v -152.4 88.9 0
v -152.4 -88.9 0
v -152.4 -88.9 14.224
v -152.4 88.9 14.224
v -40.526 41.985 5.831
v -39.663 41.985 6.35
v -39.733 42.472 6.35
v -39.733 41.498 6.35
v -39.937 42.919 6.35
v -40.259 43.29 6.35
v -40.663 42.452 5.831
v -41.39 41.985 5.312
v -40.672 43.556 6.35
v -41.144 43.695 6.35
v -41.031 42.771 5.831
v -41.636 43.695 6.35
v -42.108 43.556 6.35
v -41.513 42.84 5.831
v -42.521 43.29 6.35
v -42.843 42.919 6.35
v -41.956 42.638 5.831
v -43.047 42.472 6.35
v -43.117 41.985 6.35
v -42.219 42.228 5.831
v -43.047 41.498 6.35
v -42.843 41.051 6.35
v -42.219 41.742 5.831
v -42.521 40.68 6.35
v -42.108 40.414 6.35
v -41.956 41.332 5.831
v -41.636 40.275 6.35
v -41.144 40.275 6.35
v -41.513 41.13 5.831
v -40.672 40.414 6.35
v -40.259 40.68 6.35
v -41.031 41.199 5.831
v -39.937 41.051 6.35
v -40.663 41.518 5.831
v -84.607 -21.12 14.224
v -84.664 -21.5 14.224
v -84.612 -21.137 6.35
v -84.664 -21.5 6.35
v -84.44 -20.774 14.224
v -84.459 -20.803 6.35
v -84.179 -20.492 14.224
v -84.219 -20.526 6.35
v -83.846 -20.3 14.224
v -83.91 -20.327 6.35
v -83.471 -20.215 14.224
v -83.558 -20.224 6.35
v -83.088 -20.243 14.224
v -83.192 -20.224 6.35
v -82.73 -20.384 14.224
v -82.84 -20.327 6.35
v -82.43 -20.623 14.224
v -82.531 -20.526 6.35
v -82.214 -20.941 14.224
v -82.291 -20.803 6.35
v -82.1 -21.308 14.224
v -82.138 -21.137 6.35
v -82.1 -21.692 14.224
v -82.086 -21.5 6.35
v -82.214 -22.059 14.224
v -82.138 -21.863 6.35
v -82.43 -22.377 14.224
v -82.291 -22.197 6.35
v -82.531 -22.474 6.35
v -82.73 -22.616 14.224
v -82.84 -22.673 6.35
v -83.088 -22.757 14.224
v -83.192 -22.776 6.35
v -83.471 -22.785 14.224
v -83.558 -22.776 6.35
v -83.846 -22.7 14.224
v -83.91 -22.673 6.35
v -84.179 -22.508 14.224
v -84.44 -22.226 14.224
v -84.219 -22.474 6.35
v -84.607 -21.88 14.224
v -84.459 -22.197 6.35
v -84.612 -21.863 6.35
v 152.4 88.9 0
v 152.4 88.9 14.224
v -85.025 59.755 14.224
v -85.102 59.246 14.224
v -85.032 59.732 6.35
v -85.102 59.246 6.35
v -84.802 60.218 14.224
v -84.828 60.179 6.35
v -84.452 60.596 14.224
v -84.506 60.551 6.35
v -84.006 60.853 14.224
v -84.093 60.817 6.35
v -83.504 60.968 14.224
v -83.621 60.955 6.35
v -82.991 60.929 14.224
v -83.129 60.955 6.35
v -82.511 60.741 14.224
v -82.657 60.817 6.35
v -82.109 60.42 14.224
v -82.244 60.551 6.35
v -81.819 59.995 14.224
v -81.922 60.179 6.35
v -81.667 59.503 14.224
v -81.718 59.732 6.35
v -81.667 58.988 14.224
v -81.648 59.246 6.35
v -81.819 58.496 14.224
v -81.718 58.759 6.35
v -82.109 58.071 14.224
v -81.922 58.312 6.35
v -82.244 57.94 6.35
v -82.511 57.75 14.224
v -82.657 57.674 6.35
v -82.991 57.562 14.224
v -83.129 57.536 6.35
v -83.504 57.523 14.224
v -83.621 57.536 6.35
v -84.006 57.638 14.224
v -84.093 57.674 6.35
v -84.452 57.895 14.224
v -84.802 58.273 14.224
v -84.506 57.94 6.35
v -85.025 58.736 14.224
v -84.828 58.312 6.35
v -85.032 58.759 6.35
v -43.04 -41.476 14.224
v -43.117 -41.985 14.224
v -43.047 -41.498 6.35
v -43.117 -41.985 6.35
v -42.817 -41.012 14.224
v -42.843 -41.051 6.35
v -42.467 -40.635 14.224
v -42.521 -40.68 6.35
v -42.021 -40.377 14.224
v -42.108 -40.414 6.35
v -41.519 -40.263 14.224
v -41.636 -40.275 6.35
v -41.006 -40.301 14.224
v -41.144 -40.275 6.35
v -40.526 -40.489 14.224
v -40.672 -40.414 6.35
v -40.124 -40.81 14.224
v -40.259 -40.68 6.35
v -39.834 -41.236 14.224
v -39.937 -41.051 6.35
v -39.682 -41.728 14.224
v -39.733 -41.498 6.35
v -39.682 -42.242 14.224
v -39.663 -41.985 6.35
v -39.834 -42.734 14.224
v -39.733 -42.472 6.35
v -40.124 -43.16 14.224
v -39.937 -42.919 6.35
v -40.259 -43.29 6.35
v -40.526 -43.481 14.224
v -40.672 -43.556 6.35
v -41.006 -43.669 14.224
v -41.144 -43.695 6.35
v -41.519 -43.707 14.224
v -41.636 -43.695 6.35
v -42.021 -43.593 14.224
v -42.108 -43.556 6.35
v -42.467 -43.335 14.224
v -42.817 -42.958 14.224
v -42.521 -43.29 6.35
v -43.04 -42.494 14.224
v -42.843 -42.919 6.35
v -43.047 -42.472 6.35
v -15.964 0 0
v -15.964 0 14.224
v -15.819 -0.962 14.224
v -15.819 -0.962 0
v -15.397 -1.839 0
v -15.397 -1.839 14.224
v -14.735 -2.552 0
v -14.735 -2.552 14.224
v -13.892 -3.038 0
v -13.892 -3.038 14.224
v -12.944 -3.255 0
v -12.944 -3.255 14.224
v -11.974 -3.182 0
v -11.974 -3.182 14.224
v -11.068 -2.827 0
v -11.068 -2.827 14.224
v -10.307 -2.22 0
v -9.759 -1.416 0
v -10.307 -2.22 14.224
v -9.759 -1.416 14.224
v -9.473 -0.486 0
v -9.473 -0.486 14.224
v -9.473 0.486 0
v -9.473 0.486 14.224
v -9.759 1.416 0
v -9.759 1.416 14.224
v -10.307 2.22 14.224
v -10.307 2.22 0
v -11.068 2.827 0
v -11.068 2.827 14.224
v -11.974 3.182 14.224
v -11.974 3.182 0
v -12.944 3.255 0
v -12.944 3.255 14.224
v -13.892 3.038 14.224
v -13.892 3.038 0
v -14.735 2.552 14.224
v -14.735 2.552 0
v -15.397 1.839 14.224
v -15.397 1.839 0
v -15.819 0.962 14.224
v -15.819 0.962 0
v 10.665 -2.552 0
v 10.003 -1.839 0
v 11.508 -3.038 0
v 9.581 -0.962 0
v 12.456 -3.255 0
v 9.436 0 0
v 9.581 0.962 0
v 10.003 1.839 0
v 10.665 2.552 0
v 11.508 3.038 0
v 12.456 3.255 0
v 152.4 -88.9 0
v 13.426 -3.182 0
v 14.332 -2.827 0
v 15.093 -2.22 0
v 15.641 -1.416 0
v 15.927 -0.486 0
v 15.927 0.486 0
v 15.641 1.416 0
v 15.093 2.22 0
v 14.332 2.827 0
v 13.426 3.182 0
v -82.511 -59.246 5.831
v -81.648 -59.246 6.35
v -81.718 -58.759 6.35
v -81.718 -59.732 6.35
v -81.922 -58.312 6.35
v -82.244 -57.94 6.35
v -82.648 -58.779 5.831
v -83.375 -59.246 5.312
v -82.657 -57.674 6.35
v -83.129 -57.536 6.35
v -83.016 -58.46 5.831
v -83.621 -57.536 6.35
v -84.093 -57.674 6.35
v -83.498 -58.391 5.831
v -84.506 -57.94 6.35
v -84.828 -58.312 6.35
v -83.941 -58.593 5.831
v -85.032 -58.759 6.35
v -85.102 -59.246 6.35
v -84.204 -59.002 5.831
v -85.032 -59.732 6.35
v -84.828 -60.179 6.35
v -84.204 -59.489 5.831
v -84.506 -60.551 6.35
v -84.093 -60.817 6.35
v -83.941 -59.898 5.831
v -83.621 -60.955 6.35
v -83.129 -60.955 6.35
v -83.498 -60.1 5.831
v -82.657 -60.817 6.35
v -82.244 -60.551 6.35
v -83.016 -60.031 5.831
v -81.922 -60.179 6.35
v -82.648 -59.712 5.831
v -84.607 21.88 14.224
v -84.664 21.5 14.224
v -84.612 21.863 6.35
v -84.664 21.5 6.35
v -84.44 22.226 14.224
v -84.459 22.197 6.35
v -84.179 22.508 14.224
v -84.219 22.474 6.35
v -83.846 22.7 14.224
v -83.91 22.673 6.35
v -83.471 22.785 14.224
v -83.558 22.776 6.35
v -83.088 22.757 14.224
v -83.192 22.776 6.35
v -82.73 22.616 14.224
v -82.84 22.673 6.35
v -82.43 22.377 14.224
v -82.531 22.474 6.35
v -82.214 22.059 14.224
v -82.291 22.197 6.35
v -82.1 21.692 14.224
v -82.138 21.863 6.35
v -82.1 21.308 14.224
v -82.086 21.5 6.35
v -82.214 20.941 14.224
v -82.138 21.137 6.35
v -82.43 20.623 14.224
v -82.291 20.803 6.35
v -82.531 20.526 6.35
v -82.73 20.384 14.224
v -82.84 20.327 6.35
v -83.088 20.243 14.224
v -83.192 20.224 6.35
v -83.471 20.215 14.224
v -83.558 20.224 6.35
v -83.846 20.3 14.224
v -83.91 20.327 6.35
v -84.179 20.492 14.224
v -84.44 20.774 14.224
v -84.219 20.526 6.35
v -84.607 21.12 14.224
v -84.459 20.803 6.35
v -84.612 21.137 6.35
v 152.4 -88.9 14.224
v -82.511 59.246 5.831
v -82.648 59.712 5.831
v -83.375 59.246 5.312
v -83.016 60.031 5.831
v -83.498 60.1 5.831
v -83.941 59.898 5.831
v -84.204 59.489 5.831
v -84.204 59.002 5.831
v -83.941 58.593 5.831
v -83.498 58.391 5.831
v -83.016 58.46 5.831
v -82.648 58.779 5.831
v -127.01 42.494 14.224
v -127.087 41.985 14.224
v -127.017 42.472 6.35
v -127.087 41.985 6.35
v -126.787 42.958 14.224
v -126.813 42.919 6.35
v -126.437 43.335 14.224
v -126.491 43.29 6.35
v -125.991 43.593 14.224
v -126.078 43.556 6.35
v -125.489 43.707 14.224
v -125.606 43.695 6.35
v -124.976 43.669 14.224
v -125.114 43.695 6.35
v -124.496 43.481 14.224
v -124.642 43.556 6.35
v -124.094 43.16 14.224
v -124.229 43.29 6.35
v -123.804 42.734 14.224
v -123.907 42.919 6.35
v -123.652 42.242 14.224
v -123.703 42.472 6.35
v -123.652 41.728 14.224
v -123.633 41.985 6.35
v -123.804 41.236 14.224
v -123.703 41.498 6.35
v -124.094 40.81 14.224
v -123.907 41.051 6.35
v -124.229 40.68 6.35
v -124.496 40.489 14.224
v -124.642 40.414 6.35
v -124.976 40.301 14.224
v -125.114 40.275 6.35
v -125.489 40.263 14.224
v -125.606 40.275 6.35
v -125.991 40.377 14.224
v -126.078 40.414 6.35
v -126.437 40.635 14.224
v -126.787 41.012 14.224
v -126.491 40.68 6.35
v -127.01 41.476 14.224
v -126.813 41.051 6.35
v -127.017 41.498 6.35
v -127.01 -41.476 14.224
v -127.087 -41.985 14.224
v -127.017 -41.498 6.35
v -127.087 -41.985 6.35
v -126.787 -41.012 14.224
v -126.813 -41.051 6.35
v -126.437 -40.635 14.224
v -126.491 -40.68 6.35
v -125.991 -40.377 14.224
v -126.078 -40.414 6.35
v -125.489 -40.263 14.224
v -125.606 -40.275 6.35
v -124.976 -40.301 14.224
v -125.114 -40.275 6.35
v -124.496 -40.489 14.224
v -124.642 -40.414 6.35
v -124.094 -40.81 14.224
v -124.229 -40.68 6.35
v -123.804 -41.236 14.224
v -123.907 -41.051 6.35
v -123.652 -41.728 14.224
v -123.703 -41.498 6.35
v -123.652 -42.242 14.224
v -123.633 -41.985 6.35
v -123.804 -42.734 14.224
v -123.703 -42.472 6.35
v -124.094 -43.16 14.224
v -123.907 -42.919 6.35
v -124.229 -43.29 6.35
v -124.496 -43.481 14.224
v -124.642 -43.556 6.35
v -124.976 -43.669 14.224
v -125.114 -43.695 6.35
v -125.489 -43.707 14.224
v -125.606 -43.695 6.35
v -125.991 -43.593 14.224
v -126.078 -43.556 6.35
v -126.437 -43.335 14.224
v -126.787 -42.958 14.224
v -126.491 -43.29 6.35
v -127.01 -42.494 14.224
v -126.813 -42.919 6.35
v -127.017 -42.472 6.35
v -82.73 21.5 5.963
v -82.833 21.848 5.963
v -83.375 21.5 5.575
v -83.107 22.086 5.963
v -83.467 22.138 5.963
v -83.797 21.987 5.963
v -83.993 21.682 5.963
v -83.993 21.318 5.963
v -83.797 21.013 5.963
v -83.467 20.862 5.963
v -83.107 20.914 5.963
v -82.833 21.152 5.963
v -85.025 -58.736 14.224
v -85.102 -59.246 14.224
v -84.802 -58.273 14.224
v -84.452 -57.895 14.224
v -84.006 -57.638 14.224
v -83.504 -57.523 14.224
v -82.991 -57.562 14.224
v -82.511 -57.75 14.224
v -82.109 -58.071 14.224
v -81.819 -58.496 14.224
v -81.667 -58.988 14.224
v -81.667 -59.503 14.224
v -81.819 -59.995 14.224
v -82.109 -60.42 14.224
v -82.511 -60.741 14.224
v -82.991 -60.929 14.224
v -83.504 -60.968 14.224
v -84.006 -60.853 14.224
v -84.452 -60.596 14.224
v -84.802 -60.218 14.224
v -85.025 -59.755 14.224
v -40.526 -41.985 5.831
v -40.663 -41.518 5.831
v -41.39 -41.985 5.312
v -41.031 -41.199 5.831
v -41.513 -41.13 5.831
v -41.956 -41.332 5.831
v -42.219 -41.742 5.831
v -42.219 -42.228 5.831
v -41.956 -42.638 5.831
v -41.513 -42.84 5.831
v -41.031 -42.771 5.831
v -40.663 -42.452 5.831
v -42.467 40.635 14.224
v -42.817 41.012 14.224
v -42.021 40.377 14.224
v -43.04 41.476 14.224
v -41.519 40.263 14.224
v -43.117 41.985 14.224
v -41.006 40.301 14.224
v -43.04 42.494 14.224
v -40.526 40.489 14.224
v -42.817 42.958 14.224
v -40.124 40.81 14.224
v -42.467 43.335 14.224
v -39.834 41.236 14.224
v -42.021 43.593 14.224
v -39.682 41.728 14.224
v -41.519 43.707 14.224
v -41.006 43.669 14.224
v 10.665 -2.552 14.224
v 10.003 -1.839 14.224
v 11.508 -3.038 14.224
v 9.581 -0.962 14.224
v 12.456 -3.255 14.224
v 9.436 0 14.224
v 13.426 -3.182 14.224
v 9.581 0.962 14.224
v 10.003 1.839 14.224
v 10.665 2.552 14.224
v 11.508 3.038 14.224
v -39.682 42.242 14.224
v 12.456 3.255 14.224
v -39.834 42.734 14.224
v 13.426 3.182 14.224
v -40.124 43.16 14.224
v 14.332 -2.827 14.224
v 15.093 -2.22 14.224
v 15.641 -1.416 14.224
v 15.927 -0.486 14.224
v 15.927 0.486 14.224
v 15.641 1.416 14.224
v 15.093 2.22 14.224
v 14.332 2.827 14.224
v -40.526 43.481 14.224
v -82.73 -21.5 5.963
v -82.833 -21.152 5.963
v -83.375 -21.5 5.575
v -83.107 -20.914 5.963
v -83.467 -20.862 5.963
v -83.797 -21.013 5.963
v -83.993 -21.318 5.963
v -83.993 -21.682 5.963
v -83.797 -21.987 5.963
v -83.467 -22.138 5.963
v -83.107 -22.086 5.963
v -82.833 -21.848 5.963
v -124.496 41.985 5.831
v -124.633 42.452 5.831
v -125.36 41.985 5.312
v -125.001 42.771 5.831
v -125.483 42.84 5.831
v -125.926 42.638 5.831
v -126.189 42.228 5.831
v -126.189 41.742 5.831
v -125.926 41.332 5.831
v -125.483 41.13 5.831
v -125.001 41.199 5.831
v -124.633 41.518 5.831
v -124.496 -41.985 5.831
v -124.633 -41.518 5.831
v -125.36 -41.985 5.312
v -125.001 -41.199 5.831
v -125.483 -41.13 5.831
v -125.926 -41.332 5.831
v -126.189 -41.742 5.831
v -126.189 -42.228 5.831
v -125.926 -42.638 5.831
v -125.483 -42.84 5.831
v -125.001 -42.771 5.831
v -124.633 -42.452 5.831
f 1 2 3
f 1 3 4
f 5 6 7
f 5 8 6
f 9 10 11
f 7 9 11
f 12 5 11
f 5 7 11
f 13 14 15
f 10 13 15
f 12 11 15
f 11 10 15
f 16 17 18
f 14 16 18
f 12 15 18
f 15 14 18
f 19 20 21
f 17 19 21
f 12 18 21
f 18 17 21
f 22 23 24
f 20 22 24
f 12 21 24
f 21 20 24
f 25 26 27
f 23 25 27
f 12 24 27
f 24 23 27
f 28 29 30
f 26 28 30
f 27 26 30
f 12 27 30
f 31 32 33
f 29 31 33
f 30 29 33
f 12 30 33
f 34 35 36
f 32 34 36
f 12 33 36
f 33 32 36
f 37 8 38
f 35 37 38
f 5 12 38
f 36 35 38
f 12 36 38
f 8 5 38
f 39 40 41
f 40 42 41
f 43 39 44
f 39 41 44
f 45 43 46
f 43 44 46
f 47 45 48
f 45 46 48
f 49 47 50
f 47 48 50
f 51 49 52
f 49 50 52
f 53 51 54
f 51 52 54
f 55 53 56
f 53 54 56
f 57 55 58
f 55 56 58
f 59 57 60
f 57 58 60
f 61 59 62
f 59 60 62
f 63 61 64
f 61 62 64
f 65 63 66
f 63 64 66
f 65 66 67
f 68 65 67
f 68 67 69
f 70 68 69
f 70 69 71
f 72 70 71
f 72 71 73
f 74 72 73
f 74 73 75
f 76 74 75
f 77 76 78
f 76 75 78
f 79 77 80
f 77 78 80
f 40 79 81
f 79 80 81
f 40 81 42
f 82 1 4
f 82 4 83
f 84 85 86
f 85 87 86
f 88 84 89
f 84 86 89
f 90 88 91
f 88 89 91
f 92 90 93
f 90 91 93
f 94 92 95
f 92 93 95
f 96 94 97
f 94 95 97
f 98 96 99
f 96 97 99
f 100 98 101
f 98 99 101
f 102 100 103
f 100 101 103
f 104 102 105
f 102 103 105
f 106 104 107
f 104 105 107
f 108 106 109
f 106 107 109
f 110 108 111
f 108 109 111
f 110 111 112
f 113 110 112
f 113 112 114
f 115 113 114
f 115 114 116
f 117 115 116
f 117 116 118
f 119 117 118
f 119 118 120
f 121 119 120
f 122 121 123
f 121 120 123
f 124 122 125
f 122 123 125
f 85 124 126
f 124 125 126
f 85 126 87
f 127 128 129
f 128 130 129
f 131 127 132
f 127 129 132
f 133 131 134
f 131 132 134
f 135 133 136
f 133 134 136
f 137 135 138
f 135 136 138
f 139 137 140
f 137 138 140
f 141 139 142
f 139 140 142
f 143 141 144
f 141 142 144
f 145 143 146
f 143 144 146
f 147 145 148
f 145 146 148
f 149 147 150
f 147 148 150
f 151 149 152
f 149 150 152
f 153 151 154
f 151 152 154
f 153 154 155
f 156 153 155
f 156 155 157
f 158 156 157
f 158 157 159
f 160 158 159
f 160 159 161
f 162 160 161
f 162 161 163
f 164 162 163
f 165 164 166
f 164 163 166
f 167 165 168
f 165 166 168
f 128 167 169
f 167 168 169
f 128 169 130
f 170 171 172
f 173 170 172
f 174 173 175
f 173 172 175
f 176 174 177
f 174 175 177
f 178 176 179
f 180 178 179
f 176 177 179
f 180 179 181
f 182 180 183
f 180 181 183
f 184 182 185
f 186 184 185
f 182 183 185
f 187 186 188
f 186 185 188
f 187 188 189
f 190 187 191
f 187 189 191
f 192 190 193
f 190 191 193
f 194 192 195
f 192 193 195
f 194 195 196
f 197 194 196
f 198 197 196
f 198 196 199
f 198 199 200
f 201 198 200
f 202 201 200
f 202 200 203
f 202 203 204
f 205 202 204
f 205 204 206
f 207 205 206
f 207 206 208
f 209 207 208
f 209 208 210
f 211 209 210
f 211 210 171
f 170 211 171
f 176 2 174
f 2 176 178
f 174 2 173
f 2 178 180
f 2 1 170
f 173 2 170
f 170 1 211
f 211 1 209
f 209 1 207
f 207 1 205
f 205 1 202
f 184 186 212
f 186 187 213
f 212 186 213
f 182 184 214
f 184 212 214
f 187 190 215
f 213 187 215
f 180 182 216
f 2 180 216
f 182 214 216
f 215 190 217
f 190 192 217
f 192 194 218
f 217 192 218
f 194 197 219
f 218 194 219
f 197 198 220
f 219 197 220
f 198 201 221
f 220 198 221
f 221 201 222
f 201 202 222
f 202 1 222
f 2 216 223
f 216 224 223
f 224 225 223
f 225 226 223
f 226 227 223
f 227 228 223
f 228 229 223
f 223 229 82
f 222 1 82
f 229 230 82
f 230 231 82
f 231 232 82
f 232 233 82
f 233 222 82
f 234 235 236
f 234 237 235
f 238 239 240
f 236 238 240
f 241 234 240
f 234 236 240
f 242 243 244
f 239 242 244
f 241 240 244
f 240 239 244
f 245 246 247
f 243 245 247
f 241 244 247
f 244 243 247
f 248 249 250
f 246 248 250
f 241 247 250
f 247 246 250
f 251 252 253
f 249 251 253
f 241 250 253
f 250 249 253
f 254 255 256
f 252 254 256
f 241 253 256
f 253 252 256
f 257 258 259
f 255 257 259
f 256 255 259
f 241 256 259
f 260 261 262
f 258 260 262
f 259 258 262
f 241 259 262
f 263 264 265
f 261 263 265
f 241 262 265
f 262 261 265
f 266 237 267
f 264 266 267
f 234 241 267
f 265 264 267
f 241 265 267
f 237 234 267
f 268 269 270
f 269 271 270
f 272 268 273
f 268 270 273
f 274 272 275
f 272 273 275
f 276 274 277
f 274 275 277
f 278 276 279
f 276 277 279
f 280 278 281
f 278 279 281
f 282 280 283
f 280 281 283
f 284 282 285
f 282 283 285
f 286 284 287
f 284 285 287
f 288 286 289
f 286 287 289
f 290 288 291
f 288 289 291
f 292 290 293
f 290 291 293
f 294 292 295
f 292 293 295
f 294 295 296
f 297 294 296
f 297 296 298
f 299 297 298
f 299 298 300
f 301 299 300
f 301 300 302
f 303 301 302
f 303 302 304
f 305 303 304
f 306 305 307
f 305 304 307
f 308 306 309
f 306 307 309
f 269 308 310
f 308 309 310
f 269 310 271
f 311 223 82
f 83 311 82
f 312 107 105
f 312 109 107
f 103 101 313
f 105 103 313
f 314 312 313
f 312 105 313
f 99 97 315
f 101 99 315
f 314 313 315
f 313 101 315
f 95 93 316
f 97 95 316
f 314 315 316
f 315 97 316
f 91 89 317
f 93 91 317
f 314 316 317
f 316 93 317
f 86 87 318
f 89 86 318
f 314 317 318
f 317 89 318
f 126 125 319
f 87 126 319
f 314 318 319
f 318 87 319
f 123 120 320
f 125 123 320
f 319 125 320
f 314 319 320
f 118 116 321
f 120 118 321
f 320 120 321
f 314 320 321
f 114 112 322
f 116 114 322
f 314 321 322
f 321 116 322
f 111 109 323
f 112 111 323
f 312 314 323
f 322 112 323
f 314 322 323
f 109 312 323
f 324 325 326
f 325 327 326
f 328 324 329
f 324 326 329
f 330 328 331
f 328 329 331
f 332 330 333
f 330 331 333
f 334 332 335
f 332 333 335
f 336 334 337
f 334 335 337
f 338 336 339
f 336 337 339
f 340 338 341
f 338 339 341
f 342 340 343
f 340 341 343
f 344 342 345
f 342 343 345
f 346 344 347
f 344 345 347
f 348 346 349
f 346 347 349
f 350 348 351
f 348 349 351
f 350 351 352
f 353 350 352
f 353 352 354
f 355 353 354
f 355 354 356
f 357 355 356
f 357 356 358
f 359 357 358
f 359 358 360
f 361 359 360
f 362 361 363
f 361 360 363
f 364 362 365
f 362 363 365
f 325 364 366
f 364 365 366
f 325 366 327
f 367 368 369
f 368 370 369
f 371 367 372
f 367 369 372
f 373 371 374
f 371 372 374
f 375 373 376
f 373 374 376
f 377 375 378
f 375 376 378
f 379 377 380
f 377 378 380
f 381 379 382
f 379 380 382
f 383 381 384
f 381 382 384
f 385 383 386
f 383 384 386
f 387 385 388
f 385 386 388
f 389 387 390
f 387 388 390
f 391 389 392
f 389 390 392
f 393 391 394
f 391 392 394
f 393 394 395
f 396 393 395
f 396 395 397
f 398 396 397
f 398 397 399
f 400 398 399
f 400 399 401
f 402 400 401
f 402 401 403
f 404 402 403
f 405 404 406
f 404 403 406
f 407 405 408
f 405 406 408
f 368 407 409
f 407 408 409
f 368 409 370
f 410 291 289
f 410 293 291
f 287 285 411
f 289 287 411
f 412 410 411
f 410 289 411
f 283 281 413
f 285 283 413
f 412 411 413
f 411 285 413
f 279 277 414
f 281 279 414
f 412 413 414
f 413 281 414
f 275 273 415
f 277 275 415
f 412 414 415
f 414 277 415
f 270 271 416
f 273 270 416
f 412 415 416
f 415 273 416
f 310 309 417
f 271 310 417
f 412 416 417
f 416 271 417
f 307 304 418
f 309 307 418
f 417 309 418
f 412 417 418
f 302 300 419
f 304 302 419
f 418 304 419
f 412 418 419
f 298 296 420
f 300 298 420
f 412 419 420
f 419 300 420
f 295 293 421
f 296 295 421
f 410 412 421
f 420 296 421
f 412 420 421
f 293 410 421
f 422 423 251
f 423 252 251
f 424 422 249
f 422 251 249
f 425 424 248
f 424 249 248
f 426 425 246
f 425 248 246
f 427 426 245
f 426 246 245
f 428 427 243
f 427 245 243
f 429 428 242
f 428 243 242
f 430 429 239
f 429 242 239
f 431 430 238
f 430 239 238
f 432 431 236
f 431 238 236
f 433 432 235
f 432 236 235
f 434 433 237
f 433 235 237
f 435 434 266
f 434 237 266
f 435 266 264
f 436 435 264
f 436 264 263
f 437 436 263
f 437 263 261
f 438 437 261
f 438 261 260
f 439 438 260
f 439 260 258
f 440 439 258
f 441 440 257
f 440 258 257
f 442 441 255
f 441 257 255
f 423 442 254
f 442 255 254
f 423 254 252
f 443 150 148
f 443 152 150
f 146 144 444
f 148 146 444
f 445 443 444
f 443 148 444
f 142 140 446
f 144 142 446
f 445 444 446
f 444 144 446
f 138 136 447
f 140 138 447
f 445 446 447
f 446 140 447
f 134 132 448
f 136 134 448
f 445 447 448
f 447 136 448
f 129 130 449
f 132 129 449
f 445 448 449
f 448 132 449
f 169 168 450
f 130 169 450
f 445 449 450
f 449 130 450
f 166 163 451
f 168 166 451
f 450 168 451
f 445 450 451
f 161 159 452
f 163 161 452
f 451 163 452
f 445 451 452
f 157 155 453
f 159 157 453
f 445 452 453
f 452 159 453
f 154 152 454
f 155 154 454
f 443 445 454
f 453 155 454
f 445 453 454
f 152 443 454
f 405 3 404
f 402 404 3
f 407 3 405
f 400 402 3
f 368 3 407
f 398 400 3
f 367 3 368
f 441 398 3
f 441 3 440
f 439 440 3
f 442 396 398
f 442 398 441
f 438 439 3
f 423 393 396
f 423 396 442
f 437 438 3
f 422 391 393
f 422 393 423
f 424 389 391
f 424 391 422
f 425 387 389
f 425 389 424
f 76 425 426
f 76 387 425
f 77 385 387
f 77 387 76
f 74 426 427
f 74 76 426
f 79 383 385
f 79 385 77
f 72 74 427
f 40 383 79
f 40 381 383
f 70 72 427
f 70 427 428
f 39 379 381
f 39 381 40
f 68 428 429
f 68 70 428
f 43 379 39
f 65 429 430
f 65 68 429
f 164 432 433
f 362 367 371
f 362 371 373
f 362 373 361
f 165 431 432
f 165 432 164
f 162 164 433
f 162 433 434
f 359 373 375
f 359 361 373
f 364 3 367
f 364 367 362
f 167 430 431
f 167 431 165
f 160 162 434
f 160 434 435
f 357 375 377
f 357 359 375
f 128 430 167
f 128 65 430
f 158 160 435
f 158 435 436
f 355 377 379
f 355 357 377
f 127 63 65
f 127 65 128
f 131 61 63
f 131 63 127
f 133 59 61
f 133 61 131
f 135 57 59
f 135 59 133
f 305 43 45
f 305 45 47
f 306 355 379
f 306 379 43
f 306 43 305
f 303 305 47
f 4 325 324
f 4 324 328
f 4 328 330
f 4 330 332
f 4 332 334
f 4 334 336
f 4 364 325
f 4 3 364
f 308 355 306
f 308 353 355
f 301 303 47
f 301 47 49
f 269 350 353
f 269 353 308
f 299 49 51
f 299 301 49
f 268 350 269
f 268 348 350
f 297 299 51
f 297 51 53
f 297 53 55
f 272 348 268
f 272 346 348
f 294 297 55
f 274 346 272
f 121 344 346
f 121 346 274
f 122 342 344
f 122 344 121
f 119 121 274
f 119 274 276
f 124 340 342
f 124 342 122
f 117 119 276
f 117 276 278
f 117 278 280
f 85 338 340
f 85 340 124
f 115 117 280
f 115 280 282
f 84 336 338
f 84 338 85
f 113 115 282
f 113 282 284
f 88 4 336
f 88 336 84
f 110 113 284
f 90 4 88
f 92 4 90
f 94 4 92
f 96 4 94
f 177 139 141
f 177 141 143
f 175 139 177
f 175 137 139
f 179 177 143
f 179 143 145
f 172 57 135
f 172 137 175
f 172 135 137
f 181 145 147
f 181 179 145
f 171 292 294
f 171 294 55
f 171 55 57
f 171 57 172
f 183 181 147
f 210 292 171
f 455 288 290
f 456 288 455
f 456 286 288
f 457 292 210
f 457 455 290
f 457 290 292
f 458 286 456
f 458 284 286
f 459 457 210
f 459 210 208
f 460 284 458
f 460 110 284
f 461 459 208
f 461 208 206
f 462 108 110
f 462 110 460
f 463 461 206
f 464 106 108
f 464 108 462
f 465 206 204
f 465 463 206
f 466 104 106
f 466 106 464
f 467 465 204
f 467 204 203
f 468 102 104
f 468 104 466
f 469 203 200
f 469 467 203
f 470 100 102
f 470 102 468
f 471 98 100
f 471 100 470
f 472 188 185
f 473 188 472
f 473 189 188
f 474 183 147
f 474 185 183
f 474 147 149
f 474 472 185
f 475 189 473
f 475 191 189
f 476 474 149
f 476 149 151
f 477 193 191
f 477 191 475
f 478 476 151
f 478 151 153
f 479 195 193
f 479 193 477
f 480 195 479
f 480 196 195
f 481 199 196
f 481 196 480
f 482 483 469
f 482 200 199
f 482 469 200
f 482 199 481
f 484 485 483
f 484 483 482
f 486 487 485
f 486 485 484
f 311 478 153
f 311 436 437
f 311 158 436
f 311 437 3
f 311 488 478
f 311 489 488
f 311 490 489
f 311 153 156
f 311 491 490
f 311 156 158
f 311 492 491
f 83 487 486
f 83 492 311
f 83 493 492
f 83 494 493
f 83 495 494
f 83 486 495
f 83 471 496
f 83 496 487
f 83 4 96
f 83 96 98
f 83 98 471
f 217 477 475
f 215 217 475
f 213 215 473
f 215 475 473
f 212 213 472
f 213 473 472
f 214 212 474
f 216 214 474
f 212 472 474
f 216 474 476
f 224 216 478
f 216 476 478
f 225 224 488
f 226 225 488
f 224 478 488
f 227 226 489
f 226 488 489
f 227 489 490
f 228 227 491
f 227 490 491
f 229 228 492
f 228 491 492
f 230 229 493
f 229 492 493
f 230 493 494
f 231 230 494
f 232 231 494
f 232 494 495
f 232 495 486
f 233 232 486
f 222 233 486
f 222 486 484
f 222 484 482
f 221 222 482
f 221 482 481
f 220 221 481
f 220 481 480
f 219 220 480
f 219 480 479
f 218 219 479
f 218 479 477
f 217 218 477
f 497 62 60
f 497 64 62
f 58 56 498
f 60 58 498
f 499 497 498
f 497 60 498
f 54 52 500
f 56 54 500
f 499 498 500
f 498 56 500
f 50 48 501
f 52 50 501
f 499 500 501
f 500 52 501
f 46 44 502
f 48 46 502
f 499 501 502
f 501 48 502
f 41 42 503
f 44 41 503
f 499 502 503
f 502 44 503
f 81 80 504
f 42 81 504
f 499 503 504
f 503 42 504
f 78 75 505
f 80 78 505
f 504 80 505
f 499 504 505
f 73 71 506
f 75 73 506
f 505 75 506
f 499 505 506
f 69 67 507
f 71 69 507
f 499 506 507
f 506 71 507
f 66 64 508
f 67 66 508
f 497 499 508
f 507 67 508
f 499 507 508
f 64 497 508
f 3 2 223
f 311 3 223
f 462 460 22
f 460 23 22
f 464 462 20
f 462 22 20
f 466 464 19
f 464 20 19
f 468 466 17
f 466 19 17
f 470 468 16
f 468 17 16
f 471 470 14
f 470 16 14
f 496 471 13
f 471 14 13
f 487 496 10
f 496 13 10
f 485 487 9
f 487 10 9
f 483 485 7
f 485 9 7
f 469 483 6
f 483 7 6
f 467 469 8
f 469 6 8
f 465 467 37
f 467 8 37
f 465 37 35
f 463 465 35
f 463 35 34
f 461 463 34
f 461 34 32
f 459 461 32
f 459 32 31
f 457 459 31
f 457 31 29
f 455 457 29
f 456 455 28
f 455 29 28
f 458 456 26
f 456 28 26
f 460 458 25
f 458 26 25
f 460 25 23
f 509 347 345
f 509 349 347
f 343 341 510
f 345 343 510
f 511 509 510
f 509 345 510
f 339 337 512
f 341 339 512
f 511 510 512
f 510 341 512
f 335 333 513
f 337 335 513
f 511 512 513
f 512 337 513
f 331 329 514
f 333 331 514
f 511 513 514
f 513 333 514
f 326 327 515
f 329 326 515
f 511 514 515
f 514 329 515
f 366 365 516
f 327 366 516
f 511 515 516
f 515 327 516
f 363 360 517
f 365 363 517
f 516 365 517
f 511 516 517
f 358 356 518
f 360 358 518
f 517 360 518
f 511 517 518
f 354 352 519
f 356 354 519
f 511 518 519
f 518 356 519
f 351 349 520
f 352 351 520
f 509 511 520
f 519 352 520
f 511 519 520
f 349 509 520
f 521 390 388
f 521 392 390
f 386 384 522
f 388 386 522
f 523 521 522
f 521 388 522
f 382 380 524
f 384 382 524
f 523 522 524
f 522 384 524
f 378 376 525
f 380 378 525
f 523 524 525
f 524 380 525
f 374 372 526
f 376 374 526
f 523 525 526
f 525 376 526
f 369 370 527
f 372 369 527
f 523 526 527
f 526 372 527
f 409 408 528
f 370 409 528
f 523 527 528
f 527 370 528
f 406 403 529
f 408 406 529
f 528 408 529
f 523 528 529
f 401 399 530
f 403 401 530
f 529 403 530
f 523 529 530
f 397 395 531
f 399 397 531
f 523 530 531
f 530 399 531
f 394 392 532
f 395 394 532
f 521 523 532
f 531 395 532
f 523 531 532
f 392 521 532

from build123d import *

# Parameters (mm, degrees)
SKETCH1_W                     = 304.8
SKETCH1_H                     = 177.8
BOSS_EXTRUDE1_DEPTH           = 14.224
TAP_DRILL_FOR_8_32_TAP1_D     = 3.4544
TAP_DRILL_FOR_8_32_TAP1_DEPTH = 7.874
TAP_DRILL_FOR_8_32_TAP1_TIP   = 1.037806461
TAP_DRILL_FOR_5_40_TAP1_D     = 2.5781
TAP_DRILL_FOR_5_40_TAP1_DEPTH = 7.874
TAP_DRILL_FOR_5_40_TAP1_TIP   = 0.774539381
F_1_4_CLEARANCE_HOLE1_D       = 6.5278


with BuildPart() as part:
    # Sketch1 → Boss-Extrude1 (new body)
    with BuildSketch(Plane.XY):
        Rectangle(SKETCH1_W, SKETCH1_H)
    extrude(amount=BOSS_EXTRUDE1_DEPTH)

    # Tap Drill for #8-32 Tap1
    with Locations(Plane.XY.offset(14.224)):
        with Locations((-41.39, 41.985), (-41.39, -41.985), (-125.36, -41.985), (-125.36, 41.985), (-83.375, 59.2455), (-83.375, -59.2455)):
            Hole(TAP_DRILL_FOR_8_32_TAP1_D / 2, depth=TAP_DRILL_FOR_8_32_TAP1_DEPTH)
            with Locations((0, 0, -(TAP_DRILL_FOR_8_32_TAP1_DEPTH + TAP_DRILL_FOR_8_32_TAP1_TIP / 2))):  # 118° drill point
                Cone(0, TAP_DRILL_FOR_8_32_TAP1_D / 2, TAP_DRILL_FOR_8_32_TAP1_TIP, mode=Mode.SUBTRACT)

    # Tap Drill for #5-40 Tap1
    with Locations(Plane.XY.offset(14.224)):
        with Locations((-83.375, 21.5), (-83.375, -21.5)):
            Hole(TAP_DRILL_FOR_5_40_TAP1_D / 2, depth=TAP_DRILL_FOR_5_40_TAP1_DEPTH)
            with Locations((0, 0, -(TAP_DRILL_FOR_5_40_TAP1_DEPTH + TAP_DRILL_FOR_5_40_TAP1_TIP / 2))):  # 118° drill point
                Cone(0, TAP_DRILL_FOR_5_40_TAP1_D / 2, TAP_DRILL_FOR_5_40_TAP1_TIP, mode=Mode.SUBTRACT)

    # 1/4 Clearance Hole1 (through all)
    with Locations(Plane(origin=(0, 0, 0), x_dir=(1, 0, 0), z_dir=(0, 0, -1))):
        with Locations((-12.7, 0), (12.7, 0)):
            Hole(F_1_4_CLEARANCE_HOLE1_D / 2)


solid = part.part
